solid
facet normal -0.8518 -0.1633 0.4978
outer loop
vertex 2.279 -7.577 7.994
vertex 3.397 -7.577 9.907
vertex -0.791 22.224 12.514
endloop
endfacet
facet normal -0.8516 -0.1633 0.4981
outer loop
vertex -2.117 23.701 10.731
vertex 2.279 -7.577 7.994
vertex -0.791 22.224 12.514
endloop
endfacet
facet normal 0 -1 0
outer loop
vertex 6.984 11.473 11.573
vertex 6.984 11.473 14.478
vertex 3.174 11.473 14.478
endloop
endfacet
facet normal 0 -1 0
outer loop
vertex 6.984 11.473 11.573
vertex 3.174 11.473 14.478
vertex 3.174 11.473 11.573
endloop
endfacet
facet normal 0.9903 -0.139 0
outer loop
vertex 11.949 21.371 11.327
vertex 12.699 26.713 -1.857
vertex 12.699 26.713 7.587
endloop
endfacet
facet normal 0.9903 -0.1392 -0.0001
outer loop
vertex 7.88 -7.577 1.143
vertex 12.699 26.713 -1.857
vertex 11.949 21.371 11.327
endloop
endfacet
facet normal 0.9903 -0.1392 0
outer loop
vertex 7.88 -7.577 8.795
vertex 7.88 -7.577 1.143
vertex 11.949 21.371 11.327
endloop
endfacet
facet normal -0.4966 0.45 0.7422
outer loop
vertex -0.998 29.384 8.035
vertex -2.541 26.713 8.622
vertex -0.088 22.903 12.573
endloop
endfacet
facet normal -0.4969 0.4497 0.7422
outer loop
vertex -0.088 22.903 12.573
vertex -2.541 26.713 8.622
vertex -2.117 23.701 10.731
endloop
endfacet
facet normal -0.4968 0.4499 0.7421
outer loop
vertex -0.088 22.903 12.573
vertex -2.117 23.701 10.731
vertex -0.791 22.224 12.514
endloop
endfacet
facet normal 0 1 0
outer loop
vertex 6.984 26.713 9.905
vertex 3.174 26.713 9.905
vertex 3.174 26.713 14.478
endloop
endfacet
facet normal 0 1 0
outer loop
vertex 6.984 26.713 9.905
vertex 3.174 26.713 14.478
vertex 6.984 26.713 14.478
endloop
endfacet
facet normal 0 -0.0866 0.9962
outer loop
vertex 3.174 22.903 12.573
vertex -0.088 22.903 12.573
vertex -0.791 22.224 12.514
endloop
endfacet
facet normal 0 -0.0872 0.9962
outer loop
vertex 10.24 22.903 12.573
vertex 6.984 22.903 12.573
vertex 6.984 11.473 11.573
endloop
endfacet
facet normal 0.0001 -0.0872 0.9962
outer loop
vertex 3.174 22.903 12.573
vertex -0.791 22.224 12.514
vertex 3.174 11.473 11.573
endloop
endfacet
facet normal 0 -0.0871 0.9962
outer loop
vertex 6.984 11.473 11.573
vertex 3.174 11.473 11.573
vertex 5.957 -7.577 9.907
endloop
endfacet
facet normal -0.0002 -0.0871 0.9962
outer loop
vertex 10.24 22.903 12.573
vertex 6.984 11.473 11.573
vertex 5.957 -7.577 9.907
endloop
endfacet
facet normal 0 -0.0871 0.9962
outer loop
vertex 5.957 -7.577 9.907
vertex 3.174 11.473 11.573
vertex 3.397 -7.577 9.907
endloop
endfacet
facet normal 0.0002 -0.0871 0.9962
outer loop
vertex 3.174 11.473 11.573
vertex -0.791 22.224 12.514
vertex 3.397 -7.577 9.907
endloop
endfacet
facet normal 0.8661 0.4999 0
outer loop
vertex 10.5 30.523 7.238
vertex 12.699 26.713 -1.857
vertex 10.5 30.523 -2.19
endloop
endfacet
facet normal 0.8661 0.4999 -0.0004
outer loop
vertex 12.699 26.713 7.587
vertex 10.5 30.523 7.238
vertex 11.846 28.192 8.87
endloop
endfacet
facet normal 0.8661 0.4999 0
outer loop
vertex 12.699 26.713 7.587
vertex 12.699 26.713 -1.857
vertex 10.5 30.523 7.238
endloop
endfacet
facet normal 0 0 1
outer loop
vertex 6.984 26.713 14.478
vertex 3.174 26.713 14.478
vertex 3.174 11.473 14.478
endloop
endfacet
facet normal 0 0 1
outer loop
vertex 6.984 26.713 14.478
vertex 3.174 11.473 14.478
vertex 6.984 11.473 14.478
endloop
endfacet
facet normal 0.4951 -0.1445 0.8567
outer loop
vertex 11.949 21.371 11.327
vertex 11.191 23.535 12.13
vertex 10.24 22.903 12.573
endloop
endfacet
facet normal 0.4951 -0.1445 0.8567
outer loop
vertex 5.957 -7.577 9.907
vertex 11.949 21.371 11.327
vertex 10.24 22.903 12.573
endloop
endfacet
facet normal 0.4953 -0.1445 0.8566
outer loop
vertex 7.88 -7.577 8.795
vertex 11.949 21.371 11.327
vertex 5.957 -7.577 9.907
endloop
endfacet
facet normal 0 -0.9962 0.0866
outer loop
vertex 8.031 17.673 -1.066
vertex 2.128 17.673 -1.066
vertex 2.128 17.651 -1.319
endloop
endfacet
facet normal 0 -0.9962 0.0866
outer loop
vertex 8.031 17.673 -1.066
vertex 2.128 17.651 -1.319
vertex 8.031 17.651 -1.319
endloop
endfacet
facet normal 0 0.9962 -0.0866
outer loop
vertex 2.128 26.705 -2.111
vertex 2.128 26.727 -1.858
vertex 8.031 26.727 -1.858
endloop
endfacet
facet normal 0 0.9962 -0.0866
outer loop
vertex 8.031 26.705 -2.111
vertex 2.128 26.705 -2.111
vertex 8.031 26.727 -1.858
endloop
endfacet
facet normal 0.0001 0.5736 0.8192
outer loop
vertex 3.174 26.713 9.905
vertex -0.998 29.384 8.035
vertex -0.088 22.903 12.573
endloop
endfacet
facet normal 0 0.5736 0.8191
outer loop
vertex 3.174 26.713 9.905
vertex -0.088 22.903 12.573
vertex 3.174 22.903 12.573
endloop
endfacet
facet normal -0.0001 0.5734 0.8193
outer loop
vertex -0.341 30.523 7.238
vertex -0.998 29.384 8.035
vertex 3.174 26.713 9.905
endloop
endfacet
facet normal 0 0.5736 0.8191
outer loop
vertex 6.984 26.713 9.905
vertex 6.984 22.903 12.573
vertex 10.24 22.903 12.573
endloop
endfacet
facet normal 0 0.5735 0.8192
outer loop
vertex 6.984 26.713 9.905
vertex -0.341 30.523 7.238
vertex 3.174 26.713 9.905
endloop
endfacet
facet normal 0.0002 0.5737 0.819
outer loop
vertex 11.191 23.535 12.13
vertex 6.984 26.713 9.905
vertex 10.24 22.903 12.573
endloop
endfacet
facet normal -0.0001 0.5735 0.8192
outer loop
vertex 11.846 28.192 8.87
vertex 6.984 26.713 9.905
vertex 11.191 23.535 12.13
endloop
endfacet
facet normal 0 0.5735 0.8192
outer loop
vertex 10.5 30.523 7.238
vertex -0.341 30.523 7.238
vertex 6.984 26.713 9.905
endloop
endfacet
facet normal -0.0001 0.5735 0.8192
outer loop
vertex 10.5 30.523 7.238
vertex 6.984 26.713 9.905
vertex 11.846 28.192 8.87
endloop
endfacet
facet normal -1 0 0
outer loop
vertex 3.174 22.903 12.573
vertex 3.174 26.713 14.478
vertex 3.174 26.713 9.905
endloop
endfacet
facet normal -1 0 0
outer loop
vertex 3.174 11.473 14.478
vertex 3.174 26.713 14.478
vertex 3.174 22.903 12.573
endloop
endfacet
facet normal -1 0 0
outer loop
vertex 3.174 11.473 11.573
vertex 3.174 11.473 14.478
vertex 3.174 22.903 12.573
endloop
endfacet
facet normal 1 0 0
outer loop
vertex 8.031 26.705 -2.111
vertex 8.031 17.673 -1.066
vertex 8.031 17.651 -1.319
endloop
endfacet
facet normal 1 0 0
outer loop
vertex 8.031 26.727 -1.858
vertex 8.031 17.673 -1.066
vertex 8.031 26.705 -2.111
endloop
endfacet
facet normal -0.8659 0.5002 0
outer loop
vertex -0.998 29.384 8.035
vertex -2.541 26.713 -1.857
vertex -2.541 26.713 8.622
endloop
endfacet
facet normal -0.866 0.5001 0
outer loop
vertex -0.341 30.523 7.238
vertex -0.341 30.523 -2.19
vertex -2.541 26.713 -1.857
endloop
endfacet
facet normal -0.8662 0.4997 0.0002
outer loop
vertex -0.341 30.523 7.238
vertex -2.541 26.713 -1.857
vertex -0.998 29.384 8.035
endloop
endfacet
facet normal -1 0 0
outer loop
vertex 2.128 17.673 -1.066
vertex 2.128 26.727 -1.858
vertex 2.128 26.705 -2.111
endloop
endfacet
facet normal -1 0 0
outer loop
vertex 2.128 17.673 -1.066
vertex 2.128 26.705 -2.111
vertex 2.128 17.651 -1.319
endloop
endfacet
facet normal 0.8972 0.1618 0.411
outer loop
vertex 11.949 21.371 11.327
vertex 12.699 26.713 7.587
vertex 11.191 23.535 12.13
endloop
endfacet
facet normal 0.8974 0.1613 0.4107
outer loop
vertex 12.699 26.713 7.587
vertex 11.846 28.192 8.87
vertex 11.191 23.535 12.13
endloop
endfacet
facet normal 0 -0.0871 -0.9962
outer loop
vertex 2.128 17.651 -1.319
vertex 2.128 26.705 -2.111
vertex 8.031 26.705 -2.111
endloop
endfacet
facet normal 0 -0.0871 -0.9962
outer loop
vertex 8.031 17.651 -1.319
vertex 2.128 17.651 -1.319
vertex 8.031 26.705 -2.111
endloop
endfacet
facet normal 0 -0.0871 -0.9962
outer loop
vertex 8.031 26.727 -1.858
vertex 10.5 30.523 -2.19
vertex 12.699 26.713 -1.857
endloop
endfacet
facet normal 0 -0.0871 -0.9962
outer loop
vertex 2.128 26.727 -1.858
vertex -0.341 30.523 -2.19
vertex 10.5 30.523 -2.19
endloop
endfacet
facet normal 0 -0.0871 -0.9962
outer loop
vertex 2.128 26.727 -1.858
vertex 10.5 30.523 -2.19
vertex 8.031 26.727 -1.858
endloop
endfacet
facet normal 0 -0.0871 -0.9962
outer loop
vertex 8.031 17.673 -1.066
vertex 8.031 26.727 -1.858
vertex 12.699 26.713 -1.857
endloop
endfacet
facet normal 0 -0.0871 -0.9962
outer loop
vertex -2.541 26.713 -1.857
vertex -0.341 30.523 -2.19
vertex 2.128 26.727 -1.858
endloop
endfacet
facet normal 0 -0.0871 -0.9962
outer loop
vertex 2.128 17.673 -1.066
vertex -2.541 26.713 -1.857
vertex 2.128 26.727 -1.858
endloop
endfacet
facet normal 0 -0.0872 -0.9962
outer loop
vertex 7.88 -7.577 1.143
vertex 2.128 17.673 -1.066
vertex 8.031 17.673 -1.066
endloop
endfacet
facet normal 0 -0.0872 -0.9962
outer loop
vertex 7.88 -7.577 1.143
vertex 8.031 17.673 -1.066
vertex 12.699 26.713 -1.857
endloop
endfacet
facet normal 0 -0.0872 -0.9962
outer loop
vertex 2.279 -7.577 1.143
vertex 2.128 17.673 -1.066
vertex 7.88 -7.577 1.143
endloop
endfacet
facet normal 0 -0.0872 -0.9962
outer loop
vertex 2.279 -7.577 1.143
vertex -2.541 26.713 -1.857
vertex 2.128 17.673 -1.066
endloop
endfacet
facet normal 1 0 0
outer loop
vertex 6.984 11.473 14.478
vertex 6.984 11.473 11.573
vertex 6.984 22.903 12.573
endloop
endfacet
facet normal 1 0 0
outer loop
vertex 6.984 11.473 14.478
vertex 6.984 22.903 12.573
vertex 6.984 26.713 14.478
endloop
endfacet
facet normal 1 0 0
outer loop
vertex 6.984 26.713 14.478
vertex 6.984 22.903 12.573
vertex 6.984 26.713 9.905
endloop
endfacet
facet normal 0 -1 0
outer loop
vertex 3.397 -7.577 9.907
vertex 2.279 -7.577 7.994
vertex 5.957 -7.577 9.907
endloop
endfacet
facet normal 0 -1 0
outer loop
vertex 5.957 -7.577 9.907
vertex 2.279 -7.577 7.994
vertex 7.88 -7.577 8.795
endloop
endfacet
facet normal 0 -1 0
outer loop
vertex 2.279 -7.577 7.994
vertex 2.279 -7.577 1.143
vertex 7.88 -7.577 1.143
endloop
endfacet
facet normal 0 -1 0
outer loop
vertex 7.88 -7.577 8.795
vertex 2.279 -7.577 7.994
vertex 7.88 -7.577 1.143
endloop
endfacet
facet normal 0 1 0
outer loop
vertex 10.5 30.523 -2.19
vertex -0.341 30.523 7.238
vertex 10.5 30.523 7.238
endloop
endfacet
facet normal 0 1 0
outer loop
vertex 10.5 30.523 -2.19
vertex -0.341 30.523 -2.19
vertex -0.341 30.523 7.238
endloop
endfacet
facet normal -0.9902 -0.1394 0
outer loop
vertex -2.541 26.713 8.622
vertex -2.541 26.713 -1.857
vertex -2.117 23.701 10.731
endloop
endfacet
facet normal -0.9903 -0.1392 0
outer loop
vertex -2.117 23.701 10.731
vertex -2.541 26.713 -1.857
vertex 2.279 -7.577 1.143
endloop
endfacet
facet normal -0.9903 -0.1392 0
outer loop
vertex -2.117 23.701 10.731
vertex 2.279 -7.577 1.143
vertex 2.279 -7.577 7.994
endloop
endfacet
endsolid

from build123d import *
from OCP.BRepFilletAPI import BRepFilletAPI_MakeChamfer

# Parameters (mm, degrees)
SKETCH1_W           = 10.16
SKETCH1_H           = 25.4
BOSS_EXTRUDE1_DEPTH = 10.16
CHAMFER1_SIZE       = 5.08
CHAMFER1_SIZE2      = 3.557054294
CHAMFER6_SIZE       = 22.86
CHAMFER6_SIZE2      = 3.212763481
CHAMFER7_SIZE       = 22.86
CHAMFER7_SIZE2      = 3.212763481
CHAMFER10_SIZE2     = 1.466469684
CHAMFER10_SIZE      = 2.54
CHAMFER11_SIZE2     = 2.54
CHAMFER11_SIZE      = 1.466469684
BOSS_EXTRUDE2_DEPTH = 11.43
CHAMFER12_SIZE      = 20.32
CHAMFER12_SIZE_2    = 1.777769643
CHAMFER13_SIZE      = 1.27
CHAMFER13_SIZE2     = 0.703075315
CHAMFER13_SIZE2_2   = 0.738460687
CHAMFER14_SIZE      = 1.27
CHAMFER14_SIZE2     = 0.703075315
CHAMFER14_SIZE2_2   = 0.738460687
CHAMFER15_SIZE      = 29.032332849
CHAMFER15_SIZE_2    = 2.54
SCALE1_SCALE        = 1.5
BOSS_EXTRUDE4_DEPTH = 0.254


# Some blends are built 0.0001 mm under size
with BuildPart() as part:
    # Sketch1 → Boss-Extrude1 (new body)
    with BuildSketch(Plane.XY):
        with Locations((5.08, 12.7)):
            Rectangle(SKETCH1_W, SKETCH1_H)
    extrude(amount=BOSS_EXTRUDE1_DEPTH)

    # Chamfer1
    chamfer1_edges = [part.edges().sort_by_distance(p)[0] for p in [
        (5.08, 25.4, 10.16),
    ]]
    chamfer1_side = [part.faces().sort_by_distance(p)[0] for p in [
        (5.08, 12.7, 10.16),
    ]]
    chamfer(chamfer1_edges, length=CHAMFER1_SIZE, length2=CHAMFER1_SIZE2, reference=chamfer1_side[0])

    # Chamfer6
    chamfer6_edges = [part.edges().sort_by_distance(p)[0] for p in [
        (0, 0, 5.08),
    ]]
    chamfer6_side = [part.faces().sort_by_distance(p)[0] for p in [
        (0, 12.300671821, 4.93871201),
    ]]
    chamfer(chamfer6_edges, length=CHAMFER6_SIZE, length2=CHAMFER6_SIZE2, reference=chamfer6_side[0])

    # Chamfer7
    chamfer7_edges = [part.edges().sort_by_distance(p)[0] for p in [
        (10.16, 0, 5.08),
    ]]
    chamfer7_side = [part.faces().sort_by_distance(p)[0] for p in [
        (10.16, 12.300671821, 4.93871201),
    ]]
    chamfer(chamfer7_edges, length=CHAMFER7_SIZE, length2=CHAMFER7_SIZE2, reference=chamfer7_side[0])

    # Chamfer10
    chamfer10_edges = [part.edges().sort_by_distance(p)[0] for p in [
        (0, 25.4, 3.301472853),
    ]]
    chamfer10_side = [part.faces().sort_by_distance(p)[0] for p in [
        (0, 25.370670606, 3.301472853),
    ]]
    chamfer(chamfer10_edges, length=CHAMFER10_SIZE - 0.0001, length2=CHAMFER10_SIZE2 - 0.0001, reference=chamfer10_side[0])  # a hair under: the kernel refuses the full size

    # Chamfer11
    chamfer11_edges = [part.edges().sort_by_distance(p)[0] for p in [
        (10.16, 25.4, 3.301472853),
    ]]
    chamfer11_side = [part.faces().sort_by_distance(p)[0] for p in [
        (10.130670606, 25.4, 3.301472853),
    ]]
    chamfer(chamfer11_edges, length=CHAMFER11_SIZE - 0.0001, length2=CHAMFER11_SIZE2 - 0.0001, reference=chamfer11_side[0])  # a hair under: the kernel refuses the full size

    # Sketch2 → Boss-Extrude2 (add)
    with BuildSketch(Plane(origin=(0, 0, 0), x_dir=(-1, 0, 0), z_dir=(0, 0, -1))):
        Polygon((-5.08, 22.86), (-3.81, 22.86), (-3.81, 12.7), (-5.08, 12.7), (-6.35, 12.7), (-6.35, 22.86), align=None)
    extrude(amount=-BOSS_EXTRUDE2_DEPTH)

    # Chamfer12
    # the kernel refuses this chamfer: 20.32, 1.777769643 mm, written as the material it takes off along each edge
    with BuildSketch(Plane(origin=(-49.611801021, 0, 10.16), x_dir=(0, 0.9999943799678764, 0.003352615794033212), z_dir=(1, 0, 0))) as chamfer12_piece_1_section:
        Polygon((CHAMFER12_SIZE * 0.999994379968, -CHAMFER12_SIZE * 0.00335261579403), (-CHAMFER12_SIZE_2 * 0.00335261579374, -CHAMFER12_SIZE_2 * 0.999994379882), (0, 0), align=None)
    chamfer12_piece_1 = extrude(amount=109.383602042, mode=Mode.PRIVATE)
    chamfer12_piece_1 = split(chamfer12_piece_1, bisect_by=Plane(origin=(3.81, 16.274065634, 10.201831789), z_dir=(-1, 0, 0)), keep=Keep.TOP, mode=Mode.PRIVATE)
    chamfer12_piece_1 = split(chamfer12_piece_1, bisect_by=Plane(origin=(-22.90090051, 12.7, 10.201831789), z_dir=(0, 1, 0)), keep=Keep.TOP, mode=Mode.PRIVATE)
    add(chamfer12_piece_1, mode=Mode.SUBTRACT)
    with BuildSketch(Plane(origin=(-49.611801021, 0, 10.16), x_dir=(0, 0.9999943799678764, 0.003352615794033212), z_dir=(1, 0, 0))) as chamfer12_piece_2_section:
        Polygon((CHAMFER12_SIZE * 0.999994379968, -CHAMFER12_SIZE * 0.00335261579403), (-CHAMFER12_SIZE_2 * 0.00335261579374, -CHAMFER12_SIZE_2 * 0.999994379882), (0, 0), align=None)
    chamfer12_piece_2 = extrude(amount=109.383602042, mode=Mode.PRIVATE)
    chamfer12_piece_2 = split(chamfer12_piece_2, bisect_by=Plane(origin=(3.81, 5.349834898, 9.691469829), z_dir=(-1, 0, 0)), keep=Keep.TOP, mode=Mode.PRIVATE)
    chamfer12_piece_2 = split(chamfer12_piece_2, bisect_by=Plane(origin=(-22.90090051, 12.7, 9.691469829), z_dir=(0, -1, 0)), keep=Keep.TOP, mode=Mode.PRIVATE)
    add(chamfer12_piece_2, mode=Mode.SUBTRACT)
    with BuildSketch(Plane(origin=(-49.611801021, 0, 10.16), x_dir=(0, 0.9999943799678764, 0.003352615794033212), z_dir=(1, 0, 0))) as chamfer12_piece_3_section:
        Polygon((CHAMFER12_SIZE * 0.999994379968, -CHAMFER12_SIZE * 0.00335261579403), (-CHAMFER12_SIZE_2 * 0.00335261579374, -CHAMFER12_SIZE_2 * 0.999994379882), (0, 0), align=None)
    chamfer12_piece_3 = extrude(amount=109.383602042, mode=Mode.PRIVATE)
    chamfer12_piece_3 = split(chamfer12_piece_3, bisect_by=Plane(origin=(3.81, 5.349834898, 9.691469829), z_dir=(1, 0, 0)), keep=Keep.TOP, mode=Mode.PRIVATE)
    chamfer12_piece_3 = split(chamfer12_piece_3, bisect_by=Plane(origin=(5.08, 12.7, 9.691469829), z_dir=(0, -1, 0)), keep=Keep.TOP, mode=Mode.PRIVATE)
    chamfer12_piece_3 = split(chamfer12_piece_3, bisect_by=Plane(origin=(6.35, 5.349834898, 9.691469829), z_dir=(-1, 0, 0)), keep=Keep.TOP, mode=Mode.PRIVATE)
    add(chamfer12_piece_3, mode=Mode.SUBTRACT)
    with BuildSketch(Plane(origin=(-49.611801021, 0, 10.16), x_dir=(0, 0.9999943799678764, 0.003352615794033212), z_dir=(1, 0, 0))) as chamfer12_piece_4_section:
        Polygon((CHAMFER12_SIZE * 0.999994379968, -CHAMFER12_SIZE * 0.00335261579403), (-CHAMFER12_SIZE_2 * 0.00335261579374, -CHAMFER12_SIZE_2 * 0.999994379882), (0, 0), align=None)
    chamfer12_piece_4 = extrude(amount=109.383602042, mode=Mode.PRIVATE)
    chamfer12_piece_4 = split(chamfer12_piece_4, bisect_by=Plane(origin=(33.06090051, 12.7, 10.201831789), z_dir=(0, 1, 0)), keep=Keep.TOP, mode=Mode.PRIVATE)
    chamfer12_piece_4 = split(chamfer12_piece_4, bisect_by=Plane(origin=(6.35, 16.274065634, 10.201831789), z_dir=(1, 0, 0)), keep=Keep.TOP, mode=Mode.PRIVATE)
    add(chamfer12_piece_4, mode=Mode.SUBTRACT)
    with BuildSketch(Plane(origin=(-49.611801021, 0, 10.16), x_dir=(0, 0.9999943799678764, 0.003352615794033212), z_dir=(1, 0, 0))) as chamfer12_piece_5_section:
        Polygon((CHAMFER12_SIZE * 0.999994379968, -CHAMFER12_SIZE * 0.00335261579403), (-CHAMFER12_SIZE_2 * 0.00335261579374, -CHAMFER12_SIZE_2 * 0.999994379882), (0, 0), align=None)
    chamfer12_piece_5 = extrude(amount=109.383602042, mode=Mode.PRIVATE)
    chamfer12_piece_5 = split(chamfer12_piece_5, bisect_by=Plane(origin=(33.06090051, 12.7, 9.691469829), z_dir=(0, -1, 0)), keep=Keep.TOP, mode=Mode.PRIVATE)
    chamfer12_piece_5 = split(chamfer12_piece_5, bisect_by=Plane(origin=(6.35, 5.349834898, 9.691469829), z_dir=(1, 0, 0)), keep=Keep.TOP, mode=Mode.PRIVATE)
    add(chamfer12_piece_5, mode=Mode.SUBTRACT)

    # Chamfer13: one chamfer whose edges measure the first distance from different faces: ONE call of the kernel's chamfer builder (chamfer() names one face for all edges)
    chamfer13_edges_1 = [part.edges().sort_by_distance(p)[0] for p in [
        (0.17848686, 21.59, 9.270736426),
    ]]
    chamfer13_side_1 = [part.faces().sort_by_distance(p)[0] for p in [
        (5.08, 22.944432903, 8.322352298),
    ]]
    chamfer13_edges_2 = [part.edges().sort_by_distance(p)[0] for p in [
        (1.784868601, 10.16, 9.271115179),
    ]]
    chamfer13_side_2 = [part.faces().sort_by_distance(p)[0] for p in [
        (1.566458565, 11.714068156, 4.649741863),
    ]]
    chamfer13 = BRepFilletAPI_MakeChamfer(part.part.solid().wrapped)
    for e in chamfer13_edges_1:
        chamfer13.Add(CHAMFER13_SIZE, CHAMFER13_SIZE2, e.wrapped, chamfer13_side_1[0].wrapped)  # the first distance lies on this face
    for e in chamfer13_edges_2:
        chamfer13.Add(CHAMFER13_SIZE, CHAMFER13_SIZE2_2, e.wrapped, chamfer13_side_2[0].wrapped)  # the first distance lies on this face
    add(Compound.cast(chamfer13.Shape()), mode=Mode.REPLACE)

    # Chamfer14: one chamfer whose edges measure the first distance from different faces: ONE call of the kernel's chamfer builder (chamfer() names one face for all edges)
    chamfer14_edges_1 = [part.edges().sort_by_distance(p)[0] for p in [
        (9.98151314, 21.59, 9.270736426),
    ]]
    chamfer14_side_1 = [part.faces().sort_by_distance(p)[0] for p in [
        (8.593541435, 11.714068156, 4.649741863),
    ]]
    chamfer14_edges_2 = [part.edges().sort_by_distance(p)[0] for p in [
        (8.375131399, 10.16, 9.271115179),
    ]]
    chamfer14_side_2 = [part.faces().sort_by_distance(p)[0] for p in [
        (5.530551527, 10.889375046, 9.334927227),
    ]]
    chamfer14 = BRepFilletAPI_MakeChamfer(part.part.solid().wrapped)
    for e in chamfer14_edges_1:
        chamfer14.Add(CHAMFER14_SIZE, CHAMFER14_SIZE2, e.wrapped, chamfer14_side_1[0].wrapped)  # the first distance lies on this face
    for e in chamfer14_edges_2:
        chamfer14.Add(CHAMFER14_SIZE, CHAMFER14_SIZE2_2, e.wrapped, chamfer14_side_2[0].wrapped)  # the first distance lies on this face
    add(Compound.cast(chamfer14.Shape()), mode=Mode.REPLACE)

    # Chamfer15
    # the kernel refuses this chamfer: 29.032332849, 2.54 mm, written as the material it takes off along each edge
    with BuildSketch(Plane(origin=(-72.26067841, 0, 0), x_dir=(0, 0.9999943799678764, -0.0033526157940330635), z_dir=(1, 0, 0))) as chamfer15_piece_1:
        Polygon((CHAMFER15_SIZE * 0.999994379968, CHAMFER15_SIZE * 0.00335261579403), (-CHAMFER15_SIZE_2 * 0.00335261579403, CHAMFER15_SIZE_2 * 0.999994379968), (0, 0), align=None)
    extrude(amount=154.68135682, mode=Mode.SUBTRACT)


with BuildPart() as part_1:
    # Scale1: scaled about (5.081275253, 15.154751407, 5.333676916)
    add(part.part.scale(SCALE1_SCALE).moved(Location((-2.540637627, -7.577375703, -2.666838458))))


with BuildPart() as boss_extrude4_tool:
    # Sketch5 → Boss-Extrude4 (new body)
    with BuildSketch(Plane(origin=(0, 0.041695217, 0.476578517), x_dir=(-1, 0, 0), z_dir=(0, -0.08715574274765502, -0.9961946980917459))):
        Polygon((-8.031077325, 26.787369773), (-5.079362375, 26.787369773), (-2.127647425, 26.787369773), (-2.127647425, 17.698761839), (-8.031077325, 17.698761839), align=None)
    extrude(amount=BOSS_EXTRUDE4_DEPTH)


with BuildPart() as part_2:
    add(part_1.part)


with BuildPart() as part_3:
    # Boss-Extrude4: joined with boss_extrude4_tool
    add(part_2.part.fuse(boss_extrude4_tool.part, tol=0.00001))


solid = part_3.part
